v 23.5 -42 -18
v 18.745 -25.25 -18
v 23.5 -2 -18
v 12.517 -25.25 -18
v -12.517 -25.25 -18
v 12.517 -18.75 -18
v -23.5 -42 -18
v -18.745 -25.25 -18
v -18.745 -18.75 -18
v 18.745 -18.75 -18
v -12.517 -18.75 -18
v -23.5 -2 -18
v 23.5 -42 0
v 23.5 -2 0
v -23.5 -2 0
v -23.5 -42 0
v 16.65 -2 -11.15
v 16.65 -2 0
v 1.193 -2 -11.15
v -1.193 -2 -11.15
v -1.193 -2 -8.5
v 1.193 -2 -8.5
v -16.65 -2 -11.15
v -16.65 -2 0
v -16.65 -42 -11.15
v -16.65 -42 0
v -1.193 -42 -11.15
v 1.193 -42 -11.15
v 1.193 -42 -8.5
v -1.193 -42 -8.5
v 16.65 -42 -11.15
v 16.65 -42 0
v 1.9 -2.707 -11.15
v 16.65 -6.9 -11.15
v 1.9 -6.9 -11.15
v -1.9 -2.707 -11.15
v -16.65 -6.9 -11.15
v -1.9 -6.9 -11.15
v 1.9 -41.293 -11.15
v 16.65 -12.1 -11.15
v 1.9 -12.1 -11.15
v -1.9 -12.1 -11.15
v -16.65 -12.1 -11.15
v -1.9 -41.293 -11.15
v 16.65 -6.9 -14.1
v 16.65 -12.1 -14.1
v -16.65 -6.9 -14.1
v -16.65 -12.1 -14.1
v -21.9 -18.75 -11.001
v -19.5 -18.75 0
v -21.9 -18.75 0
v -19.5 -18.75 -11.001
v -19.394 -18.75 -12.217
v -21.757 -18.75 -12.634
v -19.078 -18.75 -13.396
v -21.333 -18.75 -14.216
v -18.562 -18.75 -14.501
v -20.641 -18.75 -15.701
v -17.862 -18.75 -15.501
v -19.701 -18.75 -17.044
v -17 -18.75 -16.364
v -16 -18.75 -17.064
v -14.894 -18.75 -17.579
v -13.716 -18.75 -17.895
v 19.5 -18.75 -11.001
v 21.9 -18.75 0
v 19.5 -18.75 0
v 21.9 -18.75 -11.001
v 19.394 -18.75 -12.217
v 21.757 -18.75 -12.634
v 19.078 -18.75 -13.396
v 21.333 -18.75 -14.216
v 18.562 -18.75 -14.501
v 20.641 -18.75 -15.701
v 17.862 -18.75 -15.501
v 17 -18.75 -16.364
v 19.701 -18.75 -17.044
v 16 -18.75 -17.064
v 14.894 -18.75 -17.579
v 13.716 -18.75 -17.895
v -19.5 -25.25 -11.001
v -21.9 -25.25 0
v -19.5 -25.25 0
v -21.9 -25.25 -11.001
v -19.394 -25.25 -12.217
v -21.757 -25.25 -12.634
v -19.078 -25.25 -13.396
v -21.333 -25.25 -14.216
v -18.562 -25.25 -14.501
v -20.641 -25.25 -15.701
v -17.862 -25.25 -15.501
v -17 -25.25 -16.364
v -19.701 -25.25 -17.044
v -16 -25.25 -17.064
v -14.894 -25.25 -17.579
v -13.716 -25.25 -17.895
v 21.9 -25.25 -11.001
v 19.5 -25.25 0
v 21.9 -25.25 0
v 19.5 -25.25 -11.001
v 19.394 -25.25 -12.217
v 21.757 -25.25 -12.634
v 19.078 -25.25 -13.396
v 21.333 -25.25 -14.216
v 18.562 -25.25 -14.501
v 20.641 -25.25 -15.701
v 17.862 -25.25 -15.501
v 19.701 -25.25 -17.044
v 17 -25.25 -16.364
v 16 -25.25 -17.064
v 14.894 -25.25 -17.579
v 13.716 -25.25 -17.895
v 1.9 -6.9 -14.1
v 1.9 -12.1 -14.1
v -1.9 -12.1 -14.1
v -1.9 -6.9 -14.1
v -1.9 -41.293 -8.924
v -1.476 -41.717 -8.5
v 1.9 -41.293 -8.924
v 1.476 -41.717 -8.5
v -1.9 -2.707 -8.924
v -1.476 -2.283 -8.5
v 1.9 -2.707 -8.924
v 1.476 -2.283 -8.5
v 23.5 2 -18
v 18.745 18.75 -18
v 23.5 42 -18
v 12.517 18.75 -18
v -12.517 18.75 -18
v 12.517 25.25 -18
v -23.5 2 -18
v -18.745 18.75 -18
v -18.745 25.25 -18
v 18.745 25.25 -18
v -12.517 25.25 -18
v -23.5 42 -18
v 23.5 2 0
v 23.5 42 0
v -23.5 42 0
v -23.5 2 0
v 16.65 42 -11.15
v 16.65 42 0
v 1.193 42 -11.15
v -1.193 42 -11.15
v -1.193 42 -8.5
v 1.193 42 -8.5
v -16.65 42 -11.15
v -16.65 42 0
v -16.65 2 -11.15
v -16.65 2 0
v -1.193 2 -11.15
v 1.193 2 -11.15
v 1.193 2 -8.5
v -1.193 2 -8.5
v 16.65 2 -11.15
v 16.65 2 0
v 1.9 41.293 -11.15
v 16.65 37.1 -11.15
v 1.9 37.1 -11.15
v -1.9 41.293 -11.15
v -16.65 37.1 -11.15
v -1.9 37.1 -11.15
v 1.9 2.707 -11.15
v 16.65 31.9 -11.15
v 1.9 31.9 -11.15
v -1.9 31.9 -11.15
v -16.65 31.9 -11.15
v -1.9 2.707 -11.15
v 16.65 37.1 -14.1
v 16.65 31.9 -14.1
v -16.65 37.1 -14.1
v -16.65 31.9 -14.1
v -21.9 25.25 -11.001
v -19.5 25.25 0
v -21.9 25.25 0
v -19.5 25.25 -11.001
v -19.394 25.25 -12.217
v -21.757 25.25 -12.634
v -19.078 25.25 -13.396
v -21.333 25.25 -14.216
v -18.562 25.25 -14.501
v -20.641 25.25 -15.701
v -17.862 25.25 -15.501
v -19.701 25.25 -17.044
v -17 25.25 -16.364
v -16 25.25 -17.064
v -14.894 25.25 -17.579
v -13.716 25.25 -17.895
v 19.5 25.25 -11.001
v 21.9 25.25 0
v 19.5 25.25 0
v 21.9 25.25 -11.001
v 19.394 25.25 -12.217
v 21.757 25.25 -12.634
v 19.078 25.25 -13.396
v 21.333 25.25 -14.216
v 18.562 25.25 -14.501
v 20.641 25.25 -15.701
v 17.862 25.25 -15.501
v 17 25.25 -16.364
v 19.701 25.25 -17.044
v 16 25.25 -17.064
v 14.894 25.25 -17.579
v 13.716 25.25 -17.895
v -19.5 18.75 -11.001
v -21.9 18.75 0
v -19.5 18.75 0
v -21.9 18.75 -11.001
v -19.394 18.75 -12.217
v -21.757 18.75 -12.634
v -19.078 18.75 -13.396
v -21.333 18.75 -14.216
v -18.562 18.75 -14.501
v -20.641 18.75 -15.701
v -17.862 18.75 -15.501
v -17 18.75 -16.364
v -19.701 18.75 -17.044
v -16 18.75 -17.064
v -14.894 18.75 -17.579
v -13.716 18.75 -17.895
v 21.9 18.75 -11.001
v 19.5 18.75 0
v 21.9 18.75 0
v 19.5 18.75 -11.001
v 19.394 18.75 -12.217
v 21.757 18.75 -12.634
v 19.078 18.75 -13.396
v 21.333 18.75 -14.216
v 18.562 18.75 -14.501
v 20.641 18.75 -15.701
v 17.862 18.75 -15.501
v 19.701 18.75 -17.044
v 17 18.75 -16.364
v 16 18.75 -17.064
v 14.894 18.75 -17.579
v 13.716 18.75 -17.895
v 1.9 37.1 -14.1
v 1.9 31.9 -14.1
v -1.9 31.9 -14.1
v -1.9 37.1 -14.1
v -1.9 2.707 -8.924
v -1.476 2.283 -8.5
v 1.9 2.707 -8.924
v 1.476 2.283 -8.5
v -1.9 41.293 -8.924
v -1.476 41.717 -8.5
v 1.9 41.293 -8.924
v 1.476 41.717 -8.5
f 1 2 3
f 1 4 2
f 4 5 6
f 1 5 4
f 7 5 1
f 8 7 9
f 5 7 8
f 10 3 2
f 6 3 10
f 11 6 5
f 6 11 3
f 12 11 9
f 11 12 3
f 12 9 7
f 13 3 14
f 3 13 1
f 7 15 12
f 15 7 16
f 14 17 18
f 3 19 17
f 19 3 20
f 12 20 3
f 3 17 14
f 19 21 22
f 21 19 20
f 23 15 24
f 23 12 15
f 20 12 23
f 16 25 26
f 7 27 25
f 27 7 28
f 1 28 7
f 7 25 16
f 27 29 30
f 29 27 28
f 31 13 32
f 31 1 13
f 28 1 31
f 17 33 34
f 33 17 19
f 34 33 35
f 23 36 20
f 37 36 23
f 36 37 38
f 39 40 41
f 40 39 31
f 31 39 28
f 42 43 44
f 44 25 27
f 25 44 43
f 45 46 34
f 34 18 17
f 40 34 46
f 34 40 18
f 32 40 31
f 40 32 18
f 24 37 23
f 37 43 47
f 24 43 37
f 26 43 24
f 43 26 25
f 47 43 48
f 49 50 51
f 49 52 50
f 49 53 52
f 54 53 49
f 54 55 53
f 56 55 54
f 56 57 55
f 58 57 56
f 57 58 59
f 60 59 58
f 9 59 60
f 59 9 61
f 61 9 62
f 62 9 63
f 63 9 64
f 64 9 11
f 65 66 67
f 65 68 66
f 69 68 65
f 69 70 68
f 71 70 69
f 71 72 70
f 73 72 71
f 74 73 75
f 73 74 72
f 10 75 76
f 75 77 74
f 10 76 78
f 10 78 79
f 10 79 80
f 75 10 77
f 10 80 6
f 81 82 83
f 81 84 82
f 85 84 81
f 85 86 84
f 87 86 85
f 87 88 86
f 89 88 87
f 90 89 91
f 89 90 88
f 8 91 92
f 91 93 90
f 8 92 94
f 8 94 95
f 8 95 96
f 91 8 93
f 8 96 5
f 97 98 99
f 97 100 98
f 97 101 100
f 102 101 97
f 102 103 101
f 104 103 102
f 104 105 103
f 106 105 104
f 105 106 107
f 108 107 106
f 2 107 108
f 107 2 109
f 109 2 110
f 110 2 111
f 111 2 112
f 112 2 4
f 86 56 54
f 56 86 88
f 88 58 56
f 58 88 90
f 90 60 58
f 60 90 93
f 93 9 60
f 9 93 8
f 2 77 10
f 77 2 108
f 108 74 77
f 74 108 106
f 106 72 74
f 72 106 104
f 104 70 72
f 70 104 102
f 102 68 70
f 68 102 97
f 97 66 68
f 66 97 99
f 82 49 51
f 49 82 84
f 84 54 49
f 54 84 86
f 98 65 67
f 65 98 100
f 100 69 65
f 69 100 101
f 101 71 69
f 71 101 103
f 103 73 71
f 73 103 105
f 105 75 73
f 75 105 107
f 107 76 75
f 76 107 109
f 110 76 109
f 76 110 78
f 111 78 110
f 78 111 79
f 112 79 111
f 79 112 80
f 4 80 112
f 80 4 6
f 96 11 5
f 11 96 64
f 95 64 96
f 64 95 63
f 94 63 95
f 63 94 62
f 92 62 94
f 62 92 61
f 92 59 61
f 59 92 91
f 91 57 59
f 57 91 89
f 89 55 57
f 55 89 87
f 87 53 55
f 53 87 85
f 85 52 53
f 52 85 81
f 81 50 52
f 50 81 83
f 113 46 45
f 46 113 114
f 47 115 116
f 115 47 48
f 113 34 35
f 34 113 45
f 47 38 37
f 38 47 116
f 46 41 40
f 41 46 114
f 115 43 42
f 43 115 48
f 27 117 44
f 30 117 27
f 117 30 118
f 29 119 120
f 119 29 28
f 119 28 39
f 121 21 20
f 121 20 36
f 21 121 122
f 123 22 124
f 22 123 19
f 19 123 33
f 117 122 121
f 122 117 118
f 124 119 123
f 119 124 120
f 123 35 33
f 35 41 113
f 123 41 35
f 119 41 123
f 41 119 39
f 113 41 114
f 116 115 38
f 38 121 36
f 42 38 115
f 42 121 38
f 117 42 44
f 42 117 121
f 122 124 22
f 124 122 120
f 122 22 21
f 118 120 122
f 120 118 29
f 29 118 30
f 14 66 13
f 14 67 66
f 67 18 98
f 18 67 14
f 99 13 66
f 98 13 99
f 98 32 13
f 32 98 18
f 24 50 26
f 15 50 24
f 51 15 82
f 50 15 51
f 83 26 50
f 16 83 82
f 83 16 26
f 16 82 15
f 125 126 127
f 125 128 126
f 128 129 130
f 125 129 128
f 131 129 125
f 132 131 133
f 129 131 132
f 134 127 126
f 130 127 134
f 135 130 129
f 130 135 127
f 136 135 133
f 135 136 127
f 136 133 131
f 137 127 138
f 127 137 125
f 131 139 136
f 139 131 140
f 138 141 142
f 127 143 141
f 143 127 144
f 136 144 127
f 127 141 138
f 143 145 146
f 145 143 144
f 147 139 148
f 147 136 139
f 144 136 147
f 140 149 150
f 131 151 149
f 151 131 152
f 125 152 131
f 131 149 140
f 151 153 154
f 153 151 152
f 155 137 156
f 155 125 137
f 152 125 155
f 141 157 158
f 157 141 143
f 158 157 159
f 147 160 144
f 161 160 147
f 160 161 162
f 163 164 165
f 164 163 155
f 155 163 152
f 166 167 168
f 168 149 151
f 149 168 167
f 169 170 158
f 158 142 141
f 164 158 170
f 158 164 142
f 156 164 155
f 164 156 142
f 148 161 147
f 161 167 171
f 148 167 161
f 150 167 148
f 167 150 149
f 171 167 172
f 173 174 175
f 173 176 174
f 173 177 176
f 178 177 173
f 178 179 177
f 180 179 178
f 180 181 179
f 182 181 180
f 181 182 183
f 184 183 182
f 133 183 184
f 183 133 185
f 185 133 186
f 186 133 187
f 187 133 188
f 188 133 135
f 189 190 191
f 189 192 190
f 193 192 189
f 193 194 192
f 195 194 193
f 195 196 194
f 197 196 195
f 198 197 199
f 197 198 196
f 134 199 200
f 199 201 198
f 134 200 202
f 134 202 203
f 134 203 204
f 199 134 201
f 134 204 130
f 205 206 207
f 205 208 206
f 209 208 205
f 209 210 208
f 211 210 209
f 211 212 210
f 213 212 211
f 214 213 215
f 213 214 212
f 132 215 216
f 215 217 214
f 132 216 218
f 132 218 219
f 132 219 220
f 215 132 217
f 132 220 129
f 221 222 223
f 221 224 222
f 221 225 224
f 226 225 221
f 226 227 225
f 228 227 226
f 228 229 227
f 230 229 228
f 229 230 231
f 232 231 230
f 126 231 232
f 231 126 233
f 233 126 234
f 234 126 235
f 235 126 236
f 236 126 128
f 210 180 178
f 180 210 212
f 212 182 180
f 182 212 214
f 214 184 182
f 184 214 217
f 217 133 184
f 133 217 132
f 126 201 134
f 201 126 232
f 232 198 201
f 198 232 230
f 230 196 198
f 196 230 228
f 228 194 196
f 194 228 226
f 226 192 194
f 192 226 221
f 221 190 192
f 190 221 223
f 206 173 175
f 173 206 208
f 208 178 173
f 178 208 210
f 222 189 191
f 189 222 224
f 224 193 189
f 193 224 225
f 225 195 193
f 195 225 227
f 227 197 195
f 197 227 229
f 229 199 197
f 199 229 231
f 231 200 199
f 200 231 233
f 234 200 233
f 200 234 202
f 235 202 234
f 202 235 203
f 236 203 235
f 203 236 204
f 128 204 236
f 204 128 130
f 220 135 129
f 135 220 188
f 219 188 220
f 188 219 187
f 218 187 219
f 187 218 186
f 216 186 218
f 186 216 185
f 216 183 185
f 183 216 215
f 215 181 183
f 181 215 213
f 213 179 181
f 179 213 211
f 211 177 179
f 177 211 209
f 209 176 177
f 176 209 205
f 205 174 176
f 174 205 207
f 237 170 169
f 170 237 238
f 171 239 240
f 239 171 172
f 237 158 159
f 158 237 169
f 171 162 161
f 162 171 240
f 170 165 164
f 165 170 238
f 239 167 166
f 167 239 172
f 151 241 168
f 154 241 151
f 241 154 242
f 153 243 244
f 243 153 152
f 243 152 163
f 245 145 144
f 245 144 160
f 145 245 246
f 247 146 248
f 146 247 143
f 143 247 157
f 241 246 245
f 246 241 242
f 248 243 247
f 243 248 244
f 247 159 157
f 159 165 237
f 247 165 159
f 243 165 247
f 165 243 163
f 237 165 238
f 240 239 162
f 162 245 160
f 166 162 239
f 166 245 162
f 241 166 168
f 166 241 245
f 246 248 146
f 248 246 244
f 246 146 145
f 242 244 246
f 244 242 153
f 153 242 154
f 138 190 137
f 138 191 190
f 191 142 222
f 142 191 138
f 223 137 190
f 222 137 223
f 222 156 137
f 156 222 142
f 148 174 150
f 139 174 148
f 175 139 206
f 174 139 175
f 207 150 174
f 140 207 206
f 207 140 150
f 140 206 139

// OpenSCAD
// file: common.scad
$fa = 10;
$fs = 0.2;
eps = 0.003;
$zstep = 0.2;

// An inward chamfer sufficient to prevent elephant's foot.
foot = 0.4;

// FINDINGS FROM CLEARANCE TEST
//
// Consider a vertical hole of width X, a layer height of 0.2, and a vertical
// post.
//   * A post of diameter X will not fit in.
//   * A post of diameter X-0.1 will fit in, but is very hard to slide in or out.
//     This is probably due mostly to the transverse grain of the print.
//     It will rotate, but with some resistance.
//   * A post of diameter X-0.2 slides in and out easily. It rotates easily, but
//     still has noticeable resistance at some points.
//   * A post of diameter X-0.3 rotates freely. It also has noticeable play
//     from side to side.
//
// Clearances are expressed as the total across both sides of a joint.
tight = 0.1;  // Intended for stationary joints.
snug = 0.2;   // Moves, but with some resistance.
loose = 0.3;  // Free movement.
extra_loose = 0.4;

// A brim is a 0.2mm layer printed near an edge which is likely to warp.
// The edge should be chamfered outwards at 45 degrees. The brim should
// be placed this far from the bottom of the edge, so it barely touches
// the chamfer.
brim_offset = 0.3;

// Menards 5/8 x 2-3/4 x 0.04 WG compression spring.
spring_od = 5/8 * 25.4;
// Subtract 10 from the relaxed length so everything is slightly tensioned
// all the time.
spring_max_length = 2.75 * 25.4 - 10;
spring_min_length = 16;  // Approximate.

// Menards 1/4 inch aluminum rod.
roller_diameter = 6.7;
roller_cavity_diameter = roller_diameter + loose;

// 550 paracord. Make this wide enough to accommodate a melted end.
string_diameter = 4.5;

// Standard spring tube.
tube_id = spring_od + 0.7;

module octagon(diameter) {
  intersection_for(a = [0, 45])
    rotate([0, 0, a])
      square(diameter, center=true);
}

// A cylinder with chamfered or flared ends, useful for dealing with
// elephant's foot on pins or holes.
module flare_cylinder(height, radius, flare_top, flare_bottom) {
  translate([0, 0, abs(flare_bottom)-eps])
    cylinder(height-abs(flare_bottom)-abs(flare_top)+eps, radius, radius);

  // Bottom flare.
  linear_extrude(abs(flare_bottom), scale=radius/(radius-flare_bottom))
    circle(radius-flare_bottom);
  
  // Top flare.
  translate([0, 0, height-abs(flare_top)])
    linear_extrude(abs(flare_top), scale=(radius-flare_top)/radius)
      circle(radius);
}

// A cube with a chamfered or flared bottom end, useful for dealing
// with elephant's foot on pins or holes.
module flare_cube(dims, flare) {
  translate([0, 0, abs(flare)-eps])
    cube([dims.x, dims.y, dims.z - abs(flare) + eps]);

  translate([dims.x/2, dims.y/2, 0])
    linear_extrude(abs(flare), scale=[dims.x/(dims.x-2*flare), dims.y/(dims.y-2*flare)])
      translate([-(dims.x-2*flare)/2, -(dims.y-2*flare)/2, abs(flare)-eps])
        square([dims.x-2*flare, dims.y-2*flare]);
}

// An approximate circle which can be printed on its side.
module circle_ish(r) {
  // Safe overhang angle.
  q = 45;
  
  intersection() {
    // Add 0.2 (one print layer) in case the bridge is messy and hangs
    // down.
    square(2*r+0.2, center=true);
    hull() {
      circle(r);
      for (a = [-1, 1])
        translate([0, a*r/cos(q), 0])
          square(eps, center=true);
    }
  }
}

// Depth of the sockets used as glue aids.
socket_depth = 5;

module socket() {
  translate([-1.5, -1.5, -eps])
    flare_cube([3, 3, socket_depth], -foot);
}

module lug() {
  flare_cube([3-snug, 3-snug, 2*socket_depth-2], foot);
}

// Nerf darts are 0.50 cal.
dart_diameter = 12.7;
dart_length = 72;

module octahedron(major_radius=1) {
  // Top and bottom halves.
  for (a = [-1, 1])
    scale([1, 1, a])
      // Extrude a square into a pyramid.
      linear_extrude(major_radius, scale=0)
        rotate([0, 0, 45])
          square(sqrt(2)*major_radius, center=true);
}

module chamfered_cube(dims, chamfer=1) {
  assert(dims.x >= 2*chamfer);
  assert(dims.y >= 2*chamfer);
  assert(dims.z >= 2*chamfer);

  hull()
    for (a = [0, 1], b = [0, 1], c = [0, 1])
        translate([
          (dims.x - 2*chamfer) * a + chamfer,
          (dims.y - 2*chamfer) * b + chamfer,
          (dims.z - 2*chamfer) * c + chamfer
        ])
          octahedron(chamfer);
}
// main file
include <common.scad>

// 120 is about the limit of the cams.
stroke = 110;
trigger_width = 8;
trigger_cavity_width = 8.5;
trigger_cavity_length = 20;

barrel_length = 220;

// Tall enough for the string.
barrel_gap = 4;

// Should be wide enough to accommodate whatever bore structure we
// want.
barrel_width = 22;
barrel_height = 33;

slider_wall = 7;
slider_width = barrel_width + 2*slider_wall;
slider_height = barrel_height + 2*slider_wall;

barrel_lug_x = 3;
barrel_lug_y = 5;

// Tested with several darts.
main_bore = 13.8;

zip_channel_height = 2.4;
zip_channel_width = 6.5;

module barrel(trigger_slot=false) {
  // Make the bore with high precision.
  $fa = 5;
  
  difference() {
    union() {
      // Main length.
      translate([-barrel_width/2, 0, 0])
        cube([barrel_width, barrel_length, barrel_height/2 - barrel_gap/2]);
      
      // Lugs on one end for attaching to a fixed piece.
      translate([-barrel_width/2 - barrel_lug_x, 0, 0])
        cube([barrel_width + barrel_lug_x*2, barrel_lug_y, barrel_height/2 - barrel_gap/2]);
    }
    
    // Bore.
    translate([0, -eps, barrel_height/2])
      rotate([-90, 0, 0])
        cylinder(barrel_length+2*eps, d=main_bore);
            
    // Outside foot chamfers.
    for (x = barrel_width/2 * [-1, 1])
      translate([x, 0, 0])
        rotate([0, 45, 0])
          cube([sqrt(0.32), barrel_length*2+eps, sqrt(0.32)], center=true);
    
    if (trigger_slot) {
      // Trigger slot.
      translate([-trigger_cavity_width/2, -eps, -eps])
        cube([trigger_cavity_width, trigger_cavity_length, barrel_height]);  

      // Inside foot chamfers.
      for (x = trigger_cavity_width/2 * [-1, 1])
        translate([x, trigger_cavity_length/2, 0])
          rotate([0, 45, 0])
            cube([sqrt(0.32), trigger_cavity_length, sqrt(0.32)], center=true);
    }
  }
    
  // Brims to prevent warping.
  brim_lip_x = 7;
  brim_lip_y = 5;
  difference() {
    translate([-barrel_width/2-brim_lip_x, -brim_lip_y, 0])
      cube([barrel_width + 2*brim_lip_x, barrel_length + 2*brim_lip_y, 0.4]);
    translate([-barrel_width/2-brim_lip_x - 0.5, brim_lip_y, -eps])
      cube([barrel_width + 2*brim_lip_x + 1, barrel_length - 2*brim_lip_y, 1]);
  }
}

module slider(length) {
  difference() {
    cube([slider_width, length, slider_height], center=true);
    cube([barrel_width + loose, length + 1, barrel_height + loose], center=true);

    // Zip tie channel.
    translate([0, zip_channel_width/2, 0]) {
      rotate([90, 0, 0]) {
        linear_extrude(zip_channel_width) {
          difference() {
            offset(slider_wall + zip_channel_height)
              square([barrel_width + eps, barrel_height - slider_wall - 1], center=true);
            offset(slider_wall)
              square([barrel_width + eps, barrel_height - slider_wall - 1], center=true);
          }
        }
      }
    }
    
    // Slot for lug on the end of the barrel.
    translate([0, length/2 - barrel_lug_y*1.5, 0]) {
      cube([
        barrel_width + 2*barrel_lug_x + snug,
        barrel_lug_y + snug,
        barrel_height + loose
      ], center=true);
    }
  }
  

  // Lugs which slide between two barrel halves.
  lug_height = barrel_gap - snug;
  lug_intrusion = 2.5;
  difference() {
    cube([slider_width, length, lug_height], center=true);
    cube([barrel_width - 2*lug_intrusion, length + 1, lug_height + 1], center=true);
    
    // End chamfers.
    for (y = length/2 * [-1, 1], z = lug_height/2 * [-1, 1])
      translate([0, y, z])
        rotate([45, 0, 0])
          cube([slider_width, 1, 1], center=true);
    
    // Length chamfers.
    for (x = (barrel_width - 2*lug_intrusion)/2 * [-1, 1], z = lug_height/2 * [-1, 1])
      translate([x, 0, z])
        rotate([0, 45, 0])
          cube([0.6, length, 0.6], center=true);
  }
}

module slider_print() {
  for (y = [-22, 22]) {
    translate([0, y, 0]) {
      rotate([0, 90, 0]) {
        intersection() {
          slider(40);
          translate([0, -100, -100])
            cube(200);
        }
      }
    }
  }
}  

slider_print();
